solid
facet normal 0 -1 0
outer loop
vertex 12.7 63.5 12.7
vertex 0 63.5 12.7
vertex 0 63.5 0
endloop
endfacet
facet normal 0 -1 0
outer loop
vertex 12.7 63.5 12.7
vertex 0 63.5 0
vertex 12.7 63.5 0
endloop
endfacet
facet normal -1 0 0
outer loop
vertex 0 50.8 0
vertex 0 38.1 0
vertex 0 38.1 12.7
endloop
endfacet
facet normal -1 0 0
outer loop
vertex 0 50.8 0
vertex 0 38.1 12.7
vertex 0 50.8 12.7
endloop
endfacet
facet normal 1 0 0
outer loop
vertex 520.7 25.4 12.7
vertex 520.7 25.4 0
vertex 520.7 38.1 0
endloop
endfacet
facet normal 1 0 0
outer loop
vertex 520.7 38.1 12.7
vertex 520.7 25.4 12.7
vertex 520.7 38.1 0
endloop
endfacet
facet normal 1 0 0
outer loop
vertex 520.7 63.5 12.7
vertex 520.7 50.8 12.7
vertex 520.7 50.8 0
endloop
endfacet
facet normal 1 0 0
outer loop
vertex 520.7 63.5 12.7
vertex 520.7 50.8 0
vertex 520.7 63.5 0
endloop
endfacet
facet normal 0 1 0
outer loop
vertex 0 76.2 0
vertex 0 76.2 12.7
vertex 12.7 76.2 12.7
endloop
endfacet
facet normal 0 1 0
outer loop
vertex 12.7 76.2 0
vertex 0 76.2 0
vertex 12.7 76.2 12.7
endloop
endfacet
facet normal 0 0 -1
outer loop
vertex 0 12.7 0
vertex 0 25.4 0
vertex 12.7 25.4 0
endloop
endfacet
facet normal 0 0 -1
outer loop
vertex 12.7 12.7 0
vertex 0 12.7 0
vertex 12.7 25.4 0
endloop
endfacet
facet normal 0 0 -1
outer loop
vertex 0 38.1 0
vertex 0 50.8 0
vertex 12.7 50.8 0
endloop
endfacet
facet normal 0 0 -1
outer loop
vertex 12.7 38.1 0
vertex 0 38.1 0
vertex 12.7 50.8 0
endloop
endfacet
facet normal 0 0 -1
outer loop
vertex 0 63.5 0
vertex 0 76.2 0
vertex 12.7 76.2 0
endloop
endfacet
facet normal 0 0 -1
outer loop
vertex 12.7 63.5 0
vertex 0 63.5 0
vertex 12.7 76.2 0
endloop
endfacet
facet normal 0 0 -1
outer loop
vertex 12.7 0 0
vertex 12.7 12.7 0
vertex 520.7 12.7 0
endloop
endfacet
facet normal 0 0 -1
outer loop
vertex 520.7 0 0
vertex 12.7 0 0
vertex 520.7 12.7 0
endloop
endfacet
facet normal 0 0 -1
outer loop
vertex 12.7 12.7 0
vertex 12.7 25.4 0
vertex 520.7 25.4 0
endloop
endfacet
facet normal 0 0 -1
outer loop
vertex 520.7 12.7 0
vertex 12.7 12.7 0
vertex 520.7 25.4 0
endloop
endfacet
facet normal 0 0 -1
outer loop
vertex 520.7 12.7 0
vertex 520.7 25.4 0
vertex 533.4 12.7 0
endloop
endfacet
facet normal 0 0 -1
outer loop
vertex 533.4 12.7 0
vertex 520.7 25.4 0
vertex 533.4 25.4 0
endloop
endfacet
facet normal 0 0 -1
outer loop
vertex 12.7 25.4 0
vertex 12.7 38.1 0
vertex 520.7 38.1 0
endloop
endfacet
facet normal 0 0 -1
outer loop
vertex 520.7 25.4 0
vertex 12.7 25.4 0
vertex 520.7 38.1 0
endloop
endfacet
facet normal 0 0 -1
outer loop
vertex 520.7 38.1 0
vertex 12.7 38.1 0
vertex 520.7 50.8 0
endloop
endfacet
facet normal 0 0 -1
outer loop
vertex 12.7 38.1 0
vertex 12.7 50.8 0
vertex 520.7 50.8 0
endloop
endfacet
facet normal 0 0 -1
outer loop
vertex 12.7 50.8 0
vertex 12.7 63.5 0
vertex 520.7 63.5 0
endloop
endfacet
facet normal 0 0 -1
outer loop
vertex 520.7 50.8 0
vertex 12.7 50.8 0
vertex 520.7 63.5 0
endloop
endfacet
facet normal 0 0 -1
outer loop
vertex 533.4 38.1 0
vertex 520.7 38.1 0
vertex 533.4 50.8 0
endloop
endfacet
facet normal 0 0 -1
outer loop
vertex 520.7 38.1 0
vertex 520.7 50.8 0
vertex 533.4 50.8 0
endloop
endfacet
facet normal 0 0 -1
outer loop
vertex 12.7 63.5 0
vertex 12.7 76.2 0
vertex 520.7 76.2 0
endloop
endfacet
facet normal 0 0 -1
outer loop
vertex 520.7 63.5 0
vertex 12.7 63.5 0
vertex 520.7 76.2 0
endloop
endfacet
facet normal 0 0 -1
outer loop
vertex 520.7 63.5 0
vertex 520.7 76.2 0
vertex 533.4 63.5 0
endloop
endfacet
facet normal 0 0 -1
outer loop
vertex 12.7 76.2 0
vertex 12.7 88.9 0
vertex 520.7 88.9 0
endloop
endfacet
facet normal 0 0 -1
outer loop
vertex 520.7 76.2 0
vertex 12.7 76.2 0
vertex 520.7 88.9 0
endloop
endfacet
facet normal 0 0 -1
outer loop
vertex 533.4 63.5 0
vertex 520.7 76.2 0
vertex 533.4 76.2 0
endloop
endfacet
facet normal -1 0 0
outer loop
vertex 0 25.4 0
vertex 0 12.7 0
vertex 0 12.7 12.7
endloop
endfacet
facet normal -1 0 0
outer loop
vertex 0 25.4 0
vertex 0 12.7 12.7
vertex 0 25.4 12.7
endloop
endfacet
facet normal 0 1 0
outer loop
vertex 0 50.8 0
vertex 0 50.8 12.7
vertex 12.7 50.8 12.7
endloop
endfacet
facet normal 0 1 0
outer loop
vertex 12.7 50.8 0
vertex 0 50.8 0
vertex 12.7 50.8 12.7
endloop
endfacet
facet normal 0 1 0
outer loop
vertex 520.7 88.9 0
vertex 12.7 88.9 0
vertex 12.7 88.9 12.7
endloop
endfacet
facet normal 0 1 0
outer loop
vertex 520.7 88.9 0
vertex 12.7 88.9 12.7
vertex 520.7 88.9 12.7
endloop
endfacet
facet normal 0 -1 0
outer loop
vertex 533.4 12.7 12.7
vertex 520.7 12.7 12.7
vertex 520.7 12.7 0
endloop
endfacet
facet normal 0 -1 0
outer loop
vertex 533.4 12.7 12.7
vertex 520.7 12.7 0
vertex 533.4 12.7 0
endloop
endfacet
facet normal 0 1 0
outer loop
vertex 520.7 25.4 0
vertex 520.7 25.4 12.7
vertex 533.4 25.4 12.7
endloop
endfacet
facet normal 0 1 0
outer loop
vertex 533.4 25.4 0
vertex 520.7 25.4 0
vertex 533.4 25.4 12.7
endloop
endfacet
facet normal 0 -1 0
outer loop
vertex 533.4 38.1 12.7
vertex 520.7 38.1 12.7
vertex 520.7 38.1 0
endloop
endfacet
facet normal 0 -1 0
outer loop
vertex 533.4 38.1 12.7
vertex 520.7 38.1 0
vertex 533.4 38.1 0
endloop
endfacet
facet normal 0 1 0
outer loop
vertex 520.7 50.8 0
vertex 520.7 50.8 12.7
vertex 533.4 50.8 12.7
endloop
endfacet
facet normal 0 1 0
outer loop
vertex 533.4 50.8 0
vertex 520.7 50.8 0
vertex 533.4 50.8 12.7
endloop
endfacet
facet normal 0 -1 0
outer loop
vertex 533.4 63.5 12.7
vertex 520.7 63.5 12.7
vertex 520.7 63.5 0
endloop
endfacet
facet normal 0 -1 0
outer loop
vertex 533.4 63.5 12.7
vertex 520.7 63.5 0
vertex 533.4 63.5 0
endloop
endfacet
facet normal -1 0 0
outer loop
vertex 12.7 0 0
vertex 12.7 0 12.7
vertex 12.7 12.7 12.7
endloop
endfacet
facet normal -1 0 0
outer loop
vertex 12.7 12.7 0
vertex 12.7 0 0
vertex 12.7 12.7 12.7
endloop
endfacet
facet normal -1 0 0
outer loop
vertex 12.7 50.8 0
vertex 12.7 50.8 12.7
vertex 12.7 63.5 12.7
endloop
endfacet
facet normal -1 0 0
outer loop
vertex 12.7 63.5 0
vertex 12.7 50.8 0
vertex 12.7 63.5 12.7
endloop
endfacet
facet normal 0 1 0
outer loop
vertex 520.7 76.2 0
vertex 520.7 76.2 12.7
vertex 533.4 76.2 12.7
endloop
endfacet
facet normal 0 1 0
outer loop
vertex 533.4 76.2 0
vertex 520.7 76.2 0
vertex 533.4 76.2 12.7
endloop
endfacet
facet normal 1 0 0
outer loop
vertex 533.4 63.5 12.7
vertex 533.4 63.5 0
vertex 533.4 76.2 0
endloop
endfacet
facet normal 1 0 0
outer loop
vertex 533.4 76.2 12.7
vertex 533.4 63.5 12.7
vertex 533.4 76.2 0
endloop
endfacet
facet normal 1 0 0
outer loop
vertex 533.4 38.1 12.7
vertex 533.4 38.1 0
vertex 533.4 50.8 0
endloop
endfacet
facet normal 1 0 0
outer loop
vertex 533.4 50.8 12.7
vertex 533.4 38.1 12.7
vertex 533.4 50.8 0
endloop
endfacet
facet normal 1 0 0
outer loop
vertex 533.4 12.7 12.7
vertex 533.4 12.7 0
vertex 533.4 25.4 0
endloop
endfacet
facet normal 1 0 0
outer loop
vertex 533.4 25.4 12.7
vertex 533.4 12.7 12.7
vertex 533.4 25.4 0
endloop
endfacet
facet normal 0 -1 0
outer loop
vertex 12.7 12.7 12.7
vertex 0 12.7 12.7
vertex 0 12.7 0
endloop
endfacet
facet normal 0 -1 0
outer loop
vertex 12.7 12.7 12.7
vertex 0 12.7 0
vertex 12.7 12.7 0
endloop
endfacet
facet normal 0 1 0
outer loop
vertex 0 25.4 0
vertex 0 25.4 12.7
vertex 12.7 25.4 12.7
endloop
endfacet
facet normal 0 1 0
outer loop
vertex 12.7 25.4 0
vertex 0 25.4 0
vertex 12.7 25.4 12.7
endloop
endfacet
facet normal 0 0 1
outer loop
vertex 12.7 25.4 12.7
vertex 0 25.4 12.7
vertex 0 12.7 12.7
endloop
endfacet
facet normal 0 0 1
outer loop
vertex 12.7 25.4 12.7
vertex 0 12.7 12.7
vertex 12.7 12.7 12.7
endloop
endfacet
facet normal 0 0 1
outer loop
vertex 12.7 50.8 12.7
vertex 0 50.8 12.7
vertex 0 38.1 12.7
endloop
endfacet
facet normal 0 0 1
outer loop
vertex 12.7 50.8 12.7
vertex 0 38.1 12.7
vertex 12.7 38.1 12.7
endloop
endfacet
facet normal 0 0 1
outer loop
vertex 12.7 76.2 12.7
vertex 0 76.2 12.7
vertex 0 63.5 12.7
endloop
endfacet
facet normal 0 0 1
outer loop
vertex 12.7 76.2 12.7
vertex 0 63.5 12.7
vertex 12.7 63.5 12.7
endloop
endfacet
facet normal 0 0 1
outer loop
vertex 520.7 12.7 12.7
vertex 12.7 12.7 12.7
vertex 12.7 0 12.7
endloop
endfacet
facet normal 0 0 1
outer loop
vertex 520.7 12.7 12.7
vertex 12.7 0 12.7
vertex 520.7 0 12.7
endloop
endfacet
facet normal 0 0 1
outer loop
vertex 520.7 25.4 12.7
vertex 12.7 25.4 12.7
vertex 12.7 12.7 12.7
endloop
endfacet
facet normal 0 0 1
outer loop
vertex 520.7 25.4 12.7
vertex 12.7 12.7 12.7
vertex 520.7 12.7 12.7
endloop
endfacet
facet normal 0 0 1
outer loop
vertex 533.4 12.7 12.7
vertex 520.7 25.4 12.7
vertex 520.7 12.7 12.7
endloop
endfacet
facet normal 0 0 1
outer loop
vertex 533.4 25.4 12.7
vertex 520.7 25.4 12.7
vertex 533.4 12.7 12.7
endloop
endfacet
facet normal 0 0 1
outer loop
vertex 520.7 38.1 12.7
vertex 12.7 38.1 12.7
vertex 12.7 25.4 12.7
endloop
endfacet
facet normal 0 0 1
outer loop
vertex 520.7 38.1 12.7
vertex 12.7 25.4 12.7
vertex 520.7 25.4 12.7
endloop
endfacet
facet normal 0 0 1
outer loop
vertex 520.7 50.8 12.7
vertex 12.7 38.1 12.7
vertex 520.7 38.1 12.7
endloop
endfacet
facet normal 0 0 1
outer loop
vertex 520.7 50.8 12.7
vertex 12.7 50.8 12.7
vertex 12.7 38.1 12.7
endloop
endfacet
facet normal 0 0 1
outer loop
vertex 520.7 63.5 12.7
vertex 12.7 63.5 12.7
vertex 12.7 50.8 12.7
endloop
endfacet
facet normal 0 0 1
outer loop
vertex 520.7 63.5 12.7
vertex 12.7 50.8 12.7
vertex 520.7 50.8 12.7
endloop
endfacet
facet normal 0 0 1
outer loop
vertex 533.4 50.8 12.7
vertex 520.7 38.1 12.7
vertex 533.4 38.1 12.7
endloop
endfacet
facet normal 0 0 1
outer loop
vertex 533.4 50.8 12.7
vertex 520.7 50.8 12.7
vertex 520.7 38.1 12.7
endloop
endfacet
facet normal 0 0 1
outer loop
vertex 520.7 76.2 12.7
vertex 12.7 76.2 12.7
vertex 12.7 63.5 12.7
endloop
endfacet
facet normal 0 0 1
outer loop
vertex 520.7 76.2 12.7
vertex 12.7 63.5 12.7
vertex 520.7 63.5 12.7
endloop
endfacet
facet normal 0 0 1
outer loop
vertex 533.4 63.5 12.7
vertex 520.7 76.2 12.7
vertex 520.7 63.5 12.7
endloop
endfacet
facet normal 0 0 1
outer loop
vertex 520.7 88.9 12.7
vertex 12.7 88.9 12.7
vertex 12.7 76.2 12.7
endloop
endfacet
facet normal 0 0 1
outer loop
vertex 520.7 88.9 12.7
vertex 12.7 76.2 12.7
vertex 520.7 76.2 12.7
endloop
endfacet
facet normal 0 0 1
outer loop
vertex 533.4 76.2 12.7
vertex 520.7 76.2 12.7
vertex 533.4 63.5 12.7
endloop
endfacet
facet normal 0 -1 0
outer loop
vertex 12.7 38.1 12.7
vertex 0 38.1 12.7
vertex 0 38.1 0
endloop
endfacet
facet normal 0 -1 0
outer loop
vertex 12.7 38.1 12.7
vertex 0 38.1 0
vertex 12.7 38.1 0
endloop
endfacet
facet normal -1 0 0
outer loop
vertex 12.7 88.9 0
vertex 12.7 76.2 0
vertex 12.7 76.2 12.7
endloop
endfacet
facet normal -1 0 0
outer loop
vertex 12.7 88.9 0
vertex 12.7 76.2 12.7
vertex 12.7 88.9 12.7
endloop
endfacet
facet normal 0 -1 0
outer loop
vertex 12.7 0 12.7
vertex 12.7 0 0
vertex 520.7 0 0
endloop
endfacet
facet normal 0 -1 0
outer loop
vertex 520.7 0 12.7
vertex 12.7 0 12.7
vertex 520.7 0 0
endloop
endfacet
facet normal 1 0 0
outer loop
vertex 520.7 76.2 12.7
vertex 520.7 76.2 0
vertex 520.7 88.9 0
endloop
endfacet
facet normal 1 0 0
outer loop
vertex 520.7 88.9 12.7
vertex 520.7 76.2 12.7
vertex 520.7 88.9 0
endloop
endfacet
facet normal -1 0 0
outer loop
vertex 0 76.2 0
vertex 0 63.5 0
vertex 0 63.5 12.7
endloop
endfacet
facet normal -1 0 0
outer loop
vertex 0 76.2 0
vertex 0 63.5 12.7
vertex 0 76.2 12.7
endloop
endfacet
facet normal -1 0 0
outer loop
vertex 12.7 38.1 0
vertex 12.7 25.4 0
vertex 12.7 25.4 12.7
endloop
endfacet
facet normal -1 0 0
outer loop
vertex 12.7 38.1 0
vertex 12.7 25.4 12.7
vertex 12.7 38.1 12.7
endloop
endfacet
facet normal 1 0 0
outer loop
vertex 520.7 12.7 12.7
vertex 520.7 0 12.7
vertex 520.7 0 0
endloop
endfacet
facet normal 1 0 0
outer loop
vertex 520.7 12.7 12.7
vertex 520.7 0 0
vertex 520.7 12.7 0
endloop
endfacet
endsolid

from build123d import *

# Parameters (mm, degrees)
F0_W     = 533.4
F0_H     = 88.9
F1_DEPTH = 12.7
F2_W     = 12.7
F2_H     = 12.7
F3_DEPTH = 25.4
F4_W     = 12.7
F4_H     = 12.7
F5_DEPTH = 25.4


with BuildPart() as f1:
    # F0 (on Top) → F1 (new body)
    with BuildSketch(Plane.XY):
        with Locations((266.7, 44.45)):
            Rectangle(F0_W, F0_H)
    extrude(amount=F1_DEPTH)

    # F2 (on face) → F3 (cut)
    with BuildSketch(Plane.XY.offset(12.7)):
        with Locations((527.05, 6.35)):
            Rectangle(F2_W, F2_H)
        with Locations((527.05, 31.75)):
            Rectangle(F2_W, F2_H)
        with Locations((527.05, 57.15)):
            Rectangle(F2_W, F2_H)
        with Locations((527.05, 82.55)):
            Rectangle(F2_W, F2_H)
    extrude(amount=-F3_DEPTH, mode=Mode.SUBTRACT)

    # F4 (on face) → F5 (cut)
    with BuildSketch(Plane.XY.offset(12.7)):
        with Locations((6.35, 6.35)):
            Rectangle(F4_W, F4_H)
        with Locations((6.35, 31.75)):
            Rectangle(F4_W, F4_H)
        with Locations((6.35, 82.55)):
            Rectangle(F4_W, F4_H)
        with Locations((6.35, 57.15)):
            Rectangle(F4_W, F4_H)
    extrude(amount=-F5_DEPTH, mode=Mode.SUBTRACT)


solid = f1.part
